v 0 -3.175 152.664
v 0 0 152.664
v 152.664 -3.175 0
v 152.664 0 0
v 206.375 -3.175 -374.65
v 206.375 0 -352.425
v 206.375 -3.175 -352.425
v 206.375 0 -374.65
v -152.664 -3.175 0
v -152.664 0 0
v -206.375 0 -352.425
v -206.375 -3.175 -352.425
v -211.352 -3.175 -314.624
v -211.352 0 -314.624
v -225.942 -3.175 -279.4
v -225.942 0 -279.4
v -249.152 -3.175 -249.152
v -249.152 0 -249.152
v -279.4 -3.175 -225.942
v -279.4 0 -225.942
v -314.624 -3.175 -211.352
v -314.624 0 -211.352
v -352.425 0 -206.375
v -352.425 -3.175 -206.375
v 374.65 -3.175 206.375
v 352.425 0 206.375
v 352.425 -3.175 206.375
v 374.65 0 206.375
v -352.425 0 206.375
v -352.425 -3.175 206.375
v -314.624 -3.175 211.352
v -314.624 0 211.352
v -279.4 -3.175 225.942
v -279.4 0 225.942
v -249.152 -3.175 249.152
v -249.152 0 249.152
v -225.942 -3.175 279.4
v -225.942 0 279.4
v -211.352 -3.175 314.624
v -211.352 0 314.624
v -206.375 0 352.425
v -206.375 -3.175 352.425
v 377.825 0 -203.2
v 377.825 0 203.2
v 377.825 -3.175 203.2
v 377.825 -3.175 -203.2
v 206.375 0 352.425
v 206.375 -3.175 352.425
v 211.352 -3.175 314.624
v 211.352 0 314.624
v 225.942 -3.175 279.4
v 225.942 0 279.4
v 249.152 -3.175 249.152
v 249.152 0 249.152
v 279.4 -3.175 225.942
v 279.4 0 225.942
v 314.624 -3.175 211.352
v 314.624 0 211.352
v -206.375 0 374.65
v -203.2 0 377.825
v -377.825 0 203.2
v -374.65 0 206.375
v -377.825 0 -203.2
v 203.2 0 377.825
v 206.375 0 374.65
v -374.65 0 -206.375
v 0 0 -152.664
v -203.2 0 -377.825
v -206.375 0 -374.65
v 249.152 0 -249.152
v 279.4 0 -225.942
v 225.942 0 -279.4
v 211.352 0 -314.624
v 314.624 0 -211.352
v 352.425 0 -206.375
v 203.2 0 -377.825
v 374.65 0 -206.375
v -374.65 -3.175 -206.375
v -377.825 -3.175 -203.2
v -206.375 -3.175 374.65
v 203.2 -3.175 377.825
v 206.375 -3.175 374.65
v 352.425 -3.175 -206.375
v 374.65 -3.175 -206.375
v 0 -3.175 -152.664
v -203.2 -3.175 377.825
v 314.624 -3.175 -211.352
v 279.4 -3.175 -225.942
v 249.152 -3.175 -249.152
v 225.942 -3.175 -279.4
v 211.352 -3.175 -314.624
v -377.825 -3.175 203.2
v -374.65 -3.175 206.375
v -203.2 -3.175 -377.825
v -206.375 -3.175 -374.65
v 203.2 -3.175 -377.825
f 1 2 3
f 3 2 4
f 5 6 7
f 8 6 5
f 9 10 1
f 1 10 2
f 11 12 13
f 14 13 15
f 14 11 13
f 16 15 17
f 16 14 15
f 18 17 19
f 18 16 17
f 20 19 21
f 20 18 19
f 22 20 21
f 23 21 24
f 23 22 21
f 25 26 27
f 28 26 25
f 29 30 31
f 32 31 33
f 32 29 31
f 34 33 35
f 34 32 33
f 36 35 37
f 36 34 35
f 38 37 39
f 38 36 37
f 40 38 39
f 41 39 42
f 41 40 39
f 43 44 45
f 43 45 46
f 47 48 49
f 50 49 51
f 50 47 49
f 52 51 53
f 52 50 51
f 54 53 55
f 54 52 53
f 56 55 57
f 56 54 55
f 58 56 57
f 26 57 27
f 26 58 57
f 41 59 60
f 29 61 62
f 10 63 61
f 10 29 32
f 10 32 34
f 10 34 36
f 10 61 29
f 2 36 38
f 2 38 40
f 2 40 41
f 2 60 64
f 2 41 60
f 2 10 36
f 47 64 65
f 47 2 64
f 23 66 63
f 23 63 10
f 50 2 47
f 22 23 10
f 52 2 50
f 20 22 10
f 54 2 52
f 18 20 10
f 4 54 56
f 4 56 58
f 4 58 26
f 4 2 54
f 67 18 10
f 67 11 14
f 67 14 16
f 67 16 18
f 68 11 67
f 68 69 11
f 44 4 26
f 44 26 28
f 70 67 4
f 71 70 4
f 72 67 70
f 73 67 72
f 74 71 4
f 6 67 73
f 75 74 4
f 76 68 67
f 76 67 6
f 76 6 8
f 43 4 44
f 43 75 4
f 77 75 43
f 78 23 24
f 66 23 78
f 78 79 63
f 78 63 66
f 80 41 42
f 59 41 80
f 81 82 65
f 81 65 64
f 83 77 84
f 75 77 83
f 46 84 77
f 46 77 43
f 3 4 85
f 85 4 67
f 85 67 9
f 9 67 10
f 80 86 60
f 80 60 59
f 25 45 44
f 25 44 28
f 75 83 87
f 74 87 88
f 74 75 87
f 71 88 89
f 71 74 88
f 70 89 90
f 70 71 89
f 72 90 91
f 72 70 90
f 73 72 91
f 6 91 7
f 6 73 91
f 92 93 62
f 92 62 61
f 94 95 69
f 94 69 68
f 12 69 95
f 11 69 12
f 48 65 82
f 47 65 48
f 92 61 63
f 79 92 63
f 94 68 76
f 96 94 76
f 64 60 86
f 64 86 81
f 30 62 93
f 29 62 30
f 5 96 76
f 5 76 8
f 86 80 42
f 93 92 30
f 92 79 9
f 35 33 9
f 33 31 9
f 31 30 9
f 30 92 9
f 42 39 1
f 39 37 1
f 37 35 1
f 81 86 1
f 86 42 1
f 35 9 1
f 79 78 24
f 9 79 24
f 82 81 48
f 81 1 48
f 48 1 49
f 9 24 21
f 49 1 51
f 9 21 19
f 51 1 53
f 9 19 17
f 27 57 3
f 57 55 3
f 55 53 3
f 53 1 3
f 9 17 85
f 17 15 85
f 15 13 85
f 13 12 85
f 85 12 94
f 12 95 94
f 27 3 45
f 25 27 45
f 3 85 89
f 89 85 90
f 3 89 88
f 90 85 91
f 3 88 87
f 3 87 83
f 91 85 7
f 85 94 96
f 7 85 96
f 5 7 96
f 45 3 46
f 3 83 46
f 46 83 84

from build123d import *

# Parameters (mm, degrees)
SKETCH2_W           = 755.65
SKETCH2_H           = 755.65
BASE_FLANGE1_DEPTH  = 3.175
CUT_EXTRUDE1_DEPTH  = 535.334672162
CUT_EXTRUDE2_DEPTH  = 535.334672162
BREAK_CORNER1_START = -3.175
BREAK_CORNER1_DEPTH = 3.175


# Read off the part's stored shape, not the designer's step: Break-Corner1
# Sheet-metal steps are written as plain solids
with BuildPart() as part:
    # Sketch2 → Base-Flange1 (new body)
    with BuildSketch(Plane(origin=(0, 0, 0), x_dir=(1, 0, 0), z_dir=(0, 1, 0))):
        Rectangle(SKETCH2_W, SKETCH2_H)
    extrude(amount=-BASE_FLANGE1_DEPTH)

    # Sketch3 → Cut-Extrude1 (cut, through all)
    with BuildSketch(Plane(origin=(0, 0, 0), x_dir=(1, 0, 0), z_dir=(0, 1, 0))):
        Polygon((0, -152.664354058), (152.664354058, 0), (0, 152.664354058), (-152.664354058, 0), align=None)
    extrude(amount=-CUT_EXTRUDE1_DEPTH, mode=Mode.SUBTRACT)

    # Sketch4 → Cut-Extrude2 (cut, through all)
    with BuildSketch(Plane(origin=(0, 0, 0), x_dir=(1, 0, 0), z_dir=(0, 1, 0))):
        with BuildLine():
            Line((377.825, 206.375), (352.425, 206.375))
            ThreePointArc((352.425, 206.375), (249.152054608, 249.152054608), (206.375, 352.425))
            Line((206.375, 352.425), (206.375, 377.825))
            Line((206.375, 377.825), (377.825, 377.825))
            Line((377.825, 377.825), (377.825, 206.375))
        make_face()
        with BuildLine():
            Line((206.375, -377.825), (206.375, -352.425))
            ThreePointArc((206.375, -352.425), (249.152054608, -249.152054608), (352.425, -206.375))
            Line((352.425, -206.375), (377.825, -206.375))
            Line((377.825, -206.375), (377.825, -377.825))
            Line((377.825, -377.825), (206.375, -377.825))
        make_face()
        with BuildLine():
            Line((-377.825, -206.375), (-352.425, -206.375))
            ThreePointArc((-352.425, -206.375), (-249.152054608, -249.152054608), (-206.375, -352.425))
            Line((-206.375, -352.425), (-206.375, -377.825))
            Line((-206.375, -377.825), (-377.825, -377.825))
            Line((-377.825, -377.825), (-377.825, -206.375))
        make_face()
        with BuildLine():
            Line((-206.375, 377.825), (-206.375, 352.425))
            ThreePointArc((-206.375, 352.425), (-249.152054608, 249.152054608), (-352.425, 206.375))
            Line((-352.425, 206.375), (-377.825, 206.375))
            Line((-377.825, 206.375), (-377.825, 377.825))
            Line((-377.825, 377.825), (-206.375, 377.825))
        make_face()
    extrude(amount=-CUT_EXTRUDE2_DEPTH, mode=Mode.SUBTRACT)

    # Break-Corner1 outline → Break-Corner1 (cut)
    with BuildSketch(Plane(origin=(0, 0, 0), x_dir=(1, 0, 0), z_dir=(0, 1, 0)).offset(BREAK_CORNER1_START)):
        Polygon((-206.375, 374.65), (-203.2, 377.825), (-206.375, 377.825), align=None)
        Polygon((203.2, 377.825), (206.375, 374.65), (206.375, 377.825), align=None)
        Polygon((377.825, -206.375), (377.825, -203.2), (374.65, -206.375), align=None)
        Polygon((374.65, 206.375), (377.825, 203.2), (377.825, 206.375), align=None)
        Polygon((-374.65, -206.375), (-377.825, -203.2), (-377.825, -206.375), align=None)
        Polygon((-377.825, 203.2), (-374.65, 206.375), (-377.825, 206.375), align=None)
        Polygon((206.375, -374.65), (203.2, -377.825), (206.375, -377.825), align=None)
        Polygon((-203.2, -377.825), (-206.375, -374.65), (-206.375, -377.825), align=None)
    extrude(amount=BREAK_CORNER1_DEPTH, mode=Mode.SUBTRACT)


solid = part.part
